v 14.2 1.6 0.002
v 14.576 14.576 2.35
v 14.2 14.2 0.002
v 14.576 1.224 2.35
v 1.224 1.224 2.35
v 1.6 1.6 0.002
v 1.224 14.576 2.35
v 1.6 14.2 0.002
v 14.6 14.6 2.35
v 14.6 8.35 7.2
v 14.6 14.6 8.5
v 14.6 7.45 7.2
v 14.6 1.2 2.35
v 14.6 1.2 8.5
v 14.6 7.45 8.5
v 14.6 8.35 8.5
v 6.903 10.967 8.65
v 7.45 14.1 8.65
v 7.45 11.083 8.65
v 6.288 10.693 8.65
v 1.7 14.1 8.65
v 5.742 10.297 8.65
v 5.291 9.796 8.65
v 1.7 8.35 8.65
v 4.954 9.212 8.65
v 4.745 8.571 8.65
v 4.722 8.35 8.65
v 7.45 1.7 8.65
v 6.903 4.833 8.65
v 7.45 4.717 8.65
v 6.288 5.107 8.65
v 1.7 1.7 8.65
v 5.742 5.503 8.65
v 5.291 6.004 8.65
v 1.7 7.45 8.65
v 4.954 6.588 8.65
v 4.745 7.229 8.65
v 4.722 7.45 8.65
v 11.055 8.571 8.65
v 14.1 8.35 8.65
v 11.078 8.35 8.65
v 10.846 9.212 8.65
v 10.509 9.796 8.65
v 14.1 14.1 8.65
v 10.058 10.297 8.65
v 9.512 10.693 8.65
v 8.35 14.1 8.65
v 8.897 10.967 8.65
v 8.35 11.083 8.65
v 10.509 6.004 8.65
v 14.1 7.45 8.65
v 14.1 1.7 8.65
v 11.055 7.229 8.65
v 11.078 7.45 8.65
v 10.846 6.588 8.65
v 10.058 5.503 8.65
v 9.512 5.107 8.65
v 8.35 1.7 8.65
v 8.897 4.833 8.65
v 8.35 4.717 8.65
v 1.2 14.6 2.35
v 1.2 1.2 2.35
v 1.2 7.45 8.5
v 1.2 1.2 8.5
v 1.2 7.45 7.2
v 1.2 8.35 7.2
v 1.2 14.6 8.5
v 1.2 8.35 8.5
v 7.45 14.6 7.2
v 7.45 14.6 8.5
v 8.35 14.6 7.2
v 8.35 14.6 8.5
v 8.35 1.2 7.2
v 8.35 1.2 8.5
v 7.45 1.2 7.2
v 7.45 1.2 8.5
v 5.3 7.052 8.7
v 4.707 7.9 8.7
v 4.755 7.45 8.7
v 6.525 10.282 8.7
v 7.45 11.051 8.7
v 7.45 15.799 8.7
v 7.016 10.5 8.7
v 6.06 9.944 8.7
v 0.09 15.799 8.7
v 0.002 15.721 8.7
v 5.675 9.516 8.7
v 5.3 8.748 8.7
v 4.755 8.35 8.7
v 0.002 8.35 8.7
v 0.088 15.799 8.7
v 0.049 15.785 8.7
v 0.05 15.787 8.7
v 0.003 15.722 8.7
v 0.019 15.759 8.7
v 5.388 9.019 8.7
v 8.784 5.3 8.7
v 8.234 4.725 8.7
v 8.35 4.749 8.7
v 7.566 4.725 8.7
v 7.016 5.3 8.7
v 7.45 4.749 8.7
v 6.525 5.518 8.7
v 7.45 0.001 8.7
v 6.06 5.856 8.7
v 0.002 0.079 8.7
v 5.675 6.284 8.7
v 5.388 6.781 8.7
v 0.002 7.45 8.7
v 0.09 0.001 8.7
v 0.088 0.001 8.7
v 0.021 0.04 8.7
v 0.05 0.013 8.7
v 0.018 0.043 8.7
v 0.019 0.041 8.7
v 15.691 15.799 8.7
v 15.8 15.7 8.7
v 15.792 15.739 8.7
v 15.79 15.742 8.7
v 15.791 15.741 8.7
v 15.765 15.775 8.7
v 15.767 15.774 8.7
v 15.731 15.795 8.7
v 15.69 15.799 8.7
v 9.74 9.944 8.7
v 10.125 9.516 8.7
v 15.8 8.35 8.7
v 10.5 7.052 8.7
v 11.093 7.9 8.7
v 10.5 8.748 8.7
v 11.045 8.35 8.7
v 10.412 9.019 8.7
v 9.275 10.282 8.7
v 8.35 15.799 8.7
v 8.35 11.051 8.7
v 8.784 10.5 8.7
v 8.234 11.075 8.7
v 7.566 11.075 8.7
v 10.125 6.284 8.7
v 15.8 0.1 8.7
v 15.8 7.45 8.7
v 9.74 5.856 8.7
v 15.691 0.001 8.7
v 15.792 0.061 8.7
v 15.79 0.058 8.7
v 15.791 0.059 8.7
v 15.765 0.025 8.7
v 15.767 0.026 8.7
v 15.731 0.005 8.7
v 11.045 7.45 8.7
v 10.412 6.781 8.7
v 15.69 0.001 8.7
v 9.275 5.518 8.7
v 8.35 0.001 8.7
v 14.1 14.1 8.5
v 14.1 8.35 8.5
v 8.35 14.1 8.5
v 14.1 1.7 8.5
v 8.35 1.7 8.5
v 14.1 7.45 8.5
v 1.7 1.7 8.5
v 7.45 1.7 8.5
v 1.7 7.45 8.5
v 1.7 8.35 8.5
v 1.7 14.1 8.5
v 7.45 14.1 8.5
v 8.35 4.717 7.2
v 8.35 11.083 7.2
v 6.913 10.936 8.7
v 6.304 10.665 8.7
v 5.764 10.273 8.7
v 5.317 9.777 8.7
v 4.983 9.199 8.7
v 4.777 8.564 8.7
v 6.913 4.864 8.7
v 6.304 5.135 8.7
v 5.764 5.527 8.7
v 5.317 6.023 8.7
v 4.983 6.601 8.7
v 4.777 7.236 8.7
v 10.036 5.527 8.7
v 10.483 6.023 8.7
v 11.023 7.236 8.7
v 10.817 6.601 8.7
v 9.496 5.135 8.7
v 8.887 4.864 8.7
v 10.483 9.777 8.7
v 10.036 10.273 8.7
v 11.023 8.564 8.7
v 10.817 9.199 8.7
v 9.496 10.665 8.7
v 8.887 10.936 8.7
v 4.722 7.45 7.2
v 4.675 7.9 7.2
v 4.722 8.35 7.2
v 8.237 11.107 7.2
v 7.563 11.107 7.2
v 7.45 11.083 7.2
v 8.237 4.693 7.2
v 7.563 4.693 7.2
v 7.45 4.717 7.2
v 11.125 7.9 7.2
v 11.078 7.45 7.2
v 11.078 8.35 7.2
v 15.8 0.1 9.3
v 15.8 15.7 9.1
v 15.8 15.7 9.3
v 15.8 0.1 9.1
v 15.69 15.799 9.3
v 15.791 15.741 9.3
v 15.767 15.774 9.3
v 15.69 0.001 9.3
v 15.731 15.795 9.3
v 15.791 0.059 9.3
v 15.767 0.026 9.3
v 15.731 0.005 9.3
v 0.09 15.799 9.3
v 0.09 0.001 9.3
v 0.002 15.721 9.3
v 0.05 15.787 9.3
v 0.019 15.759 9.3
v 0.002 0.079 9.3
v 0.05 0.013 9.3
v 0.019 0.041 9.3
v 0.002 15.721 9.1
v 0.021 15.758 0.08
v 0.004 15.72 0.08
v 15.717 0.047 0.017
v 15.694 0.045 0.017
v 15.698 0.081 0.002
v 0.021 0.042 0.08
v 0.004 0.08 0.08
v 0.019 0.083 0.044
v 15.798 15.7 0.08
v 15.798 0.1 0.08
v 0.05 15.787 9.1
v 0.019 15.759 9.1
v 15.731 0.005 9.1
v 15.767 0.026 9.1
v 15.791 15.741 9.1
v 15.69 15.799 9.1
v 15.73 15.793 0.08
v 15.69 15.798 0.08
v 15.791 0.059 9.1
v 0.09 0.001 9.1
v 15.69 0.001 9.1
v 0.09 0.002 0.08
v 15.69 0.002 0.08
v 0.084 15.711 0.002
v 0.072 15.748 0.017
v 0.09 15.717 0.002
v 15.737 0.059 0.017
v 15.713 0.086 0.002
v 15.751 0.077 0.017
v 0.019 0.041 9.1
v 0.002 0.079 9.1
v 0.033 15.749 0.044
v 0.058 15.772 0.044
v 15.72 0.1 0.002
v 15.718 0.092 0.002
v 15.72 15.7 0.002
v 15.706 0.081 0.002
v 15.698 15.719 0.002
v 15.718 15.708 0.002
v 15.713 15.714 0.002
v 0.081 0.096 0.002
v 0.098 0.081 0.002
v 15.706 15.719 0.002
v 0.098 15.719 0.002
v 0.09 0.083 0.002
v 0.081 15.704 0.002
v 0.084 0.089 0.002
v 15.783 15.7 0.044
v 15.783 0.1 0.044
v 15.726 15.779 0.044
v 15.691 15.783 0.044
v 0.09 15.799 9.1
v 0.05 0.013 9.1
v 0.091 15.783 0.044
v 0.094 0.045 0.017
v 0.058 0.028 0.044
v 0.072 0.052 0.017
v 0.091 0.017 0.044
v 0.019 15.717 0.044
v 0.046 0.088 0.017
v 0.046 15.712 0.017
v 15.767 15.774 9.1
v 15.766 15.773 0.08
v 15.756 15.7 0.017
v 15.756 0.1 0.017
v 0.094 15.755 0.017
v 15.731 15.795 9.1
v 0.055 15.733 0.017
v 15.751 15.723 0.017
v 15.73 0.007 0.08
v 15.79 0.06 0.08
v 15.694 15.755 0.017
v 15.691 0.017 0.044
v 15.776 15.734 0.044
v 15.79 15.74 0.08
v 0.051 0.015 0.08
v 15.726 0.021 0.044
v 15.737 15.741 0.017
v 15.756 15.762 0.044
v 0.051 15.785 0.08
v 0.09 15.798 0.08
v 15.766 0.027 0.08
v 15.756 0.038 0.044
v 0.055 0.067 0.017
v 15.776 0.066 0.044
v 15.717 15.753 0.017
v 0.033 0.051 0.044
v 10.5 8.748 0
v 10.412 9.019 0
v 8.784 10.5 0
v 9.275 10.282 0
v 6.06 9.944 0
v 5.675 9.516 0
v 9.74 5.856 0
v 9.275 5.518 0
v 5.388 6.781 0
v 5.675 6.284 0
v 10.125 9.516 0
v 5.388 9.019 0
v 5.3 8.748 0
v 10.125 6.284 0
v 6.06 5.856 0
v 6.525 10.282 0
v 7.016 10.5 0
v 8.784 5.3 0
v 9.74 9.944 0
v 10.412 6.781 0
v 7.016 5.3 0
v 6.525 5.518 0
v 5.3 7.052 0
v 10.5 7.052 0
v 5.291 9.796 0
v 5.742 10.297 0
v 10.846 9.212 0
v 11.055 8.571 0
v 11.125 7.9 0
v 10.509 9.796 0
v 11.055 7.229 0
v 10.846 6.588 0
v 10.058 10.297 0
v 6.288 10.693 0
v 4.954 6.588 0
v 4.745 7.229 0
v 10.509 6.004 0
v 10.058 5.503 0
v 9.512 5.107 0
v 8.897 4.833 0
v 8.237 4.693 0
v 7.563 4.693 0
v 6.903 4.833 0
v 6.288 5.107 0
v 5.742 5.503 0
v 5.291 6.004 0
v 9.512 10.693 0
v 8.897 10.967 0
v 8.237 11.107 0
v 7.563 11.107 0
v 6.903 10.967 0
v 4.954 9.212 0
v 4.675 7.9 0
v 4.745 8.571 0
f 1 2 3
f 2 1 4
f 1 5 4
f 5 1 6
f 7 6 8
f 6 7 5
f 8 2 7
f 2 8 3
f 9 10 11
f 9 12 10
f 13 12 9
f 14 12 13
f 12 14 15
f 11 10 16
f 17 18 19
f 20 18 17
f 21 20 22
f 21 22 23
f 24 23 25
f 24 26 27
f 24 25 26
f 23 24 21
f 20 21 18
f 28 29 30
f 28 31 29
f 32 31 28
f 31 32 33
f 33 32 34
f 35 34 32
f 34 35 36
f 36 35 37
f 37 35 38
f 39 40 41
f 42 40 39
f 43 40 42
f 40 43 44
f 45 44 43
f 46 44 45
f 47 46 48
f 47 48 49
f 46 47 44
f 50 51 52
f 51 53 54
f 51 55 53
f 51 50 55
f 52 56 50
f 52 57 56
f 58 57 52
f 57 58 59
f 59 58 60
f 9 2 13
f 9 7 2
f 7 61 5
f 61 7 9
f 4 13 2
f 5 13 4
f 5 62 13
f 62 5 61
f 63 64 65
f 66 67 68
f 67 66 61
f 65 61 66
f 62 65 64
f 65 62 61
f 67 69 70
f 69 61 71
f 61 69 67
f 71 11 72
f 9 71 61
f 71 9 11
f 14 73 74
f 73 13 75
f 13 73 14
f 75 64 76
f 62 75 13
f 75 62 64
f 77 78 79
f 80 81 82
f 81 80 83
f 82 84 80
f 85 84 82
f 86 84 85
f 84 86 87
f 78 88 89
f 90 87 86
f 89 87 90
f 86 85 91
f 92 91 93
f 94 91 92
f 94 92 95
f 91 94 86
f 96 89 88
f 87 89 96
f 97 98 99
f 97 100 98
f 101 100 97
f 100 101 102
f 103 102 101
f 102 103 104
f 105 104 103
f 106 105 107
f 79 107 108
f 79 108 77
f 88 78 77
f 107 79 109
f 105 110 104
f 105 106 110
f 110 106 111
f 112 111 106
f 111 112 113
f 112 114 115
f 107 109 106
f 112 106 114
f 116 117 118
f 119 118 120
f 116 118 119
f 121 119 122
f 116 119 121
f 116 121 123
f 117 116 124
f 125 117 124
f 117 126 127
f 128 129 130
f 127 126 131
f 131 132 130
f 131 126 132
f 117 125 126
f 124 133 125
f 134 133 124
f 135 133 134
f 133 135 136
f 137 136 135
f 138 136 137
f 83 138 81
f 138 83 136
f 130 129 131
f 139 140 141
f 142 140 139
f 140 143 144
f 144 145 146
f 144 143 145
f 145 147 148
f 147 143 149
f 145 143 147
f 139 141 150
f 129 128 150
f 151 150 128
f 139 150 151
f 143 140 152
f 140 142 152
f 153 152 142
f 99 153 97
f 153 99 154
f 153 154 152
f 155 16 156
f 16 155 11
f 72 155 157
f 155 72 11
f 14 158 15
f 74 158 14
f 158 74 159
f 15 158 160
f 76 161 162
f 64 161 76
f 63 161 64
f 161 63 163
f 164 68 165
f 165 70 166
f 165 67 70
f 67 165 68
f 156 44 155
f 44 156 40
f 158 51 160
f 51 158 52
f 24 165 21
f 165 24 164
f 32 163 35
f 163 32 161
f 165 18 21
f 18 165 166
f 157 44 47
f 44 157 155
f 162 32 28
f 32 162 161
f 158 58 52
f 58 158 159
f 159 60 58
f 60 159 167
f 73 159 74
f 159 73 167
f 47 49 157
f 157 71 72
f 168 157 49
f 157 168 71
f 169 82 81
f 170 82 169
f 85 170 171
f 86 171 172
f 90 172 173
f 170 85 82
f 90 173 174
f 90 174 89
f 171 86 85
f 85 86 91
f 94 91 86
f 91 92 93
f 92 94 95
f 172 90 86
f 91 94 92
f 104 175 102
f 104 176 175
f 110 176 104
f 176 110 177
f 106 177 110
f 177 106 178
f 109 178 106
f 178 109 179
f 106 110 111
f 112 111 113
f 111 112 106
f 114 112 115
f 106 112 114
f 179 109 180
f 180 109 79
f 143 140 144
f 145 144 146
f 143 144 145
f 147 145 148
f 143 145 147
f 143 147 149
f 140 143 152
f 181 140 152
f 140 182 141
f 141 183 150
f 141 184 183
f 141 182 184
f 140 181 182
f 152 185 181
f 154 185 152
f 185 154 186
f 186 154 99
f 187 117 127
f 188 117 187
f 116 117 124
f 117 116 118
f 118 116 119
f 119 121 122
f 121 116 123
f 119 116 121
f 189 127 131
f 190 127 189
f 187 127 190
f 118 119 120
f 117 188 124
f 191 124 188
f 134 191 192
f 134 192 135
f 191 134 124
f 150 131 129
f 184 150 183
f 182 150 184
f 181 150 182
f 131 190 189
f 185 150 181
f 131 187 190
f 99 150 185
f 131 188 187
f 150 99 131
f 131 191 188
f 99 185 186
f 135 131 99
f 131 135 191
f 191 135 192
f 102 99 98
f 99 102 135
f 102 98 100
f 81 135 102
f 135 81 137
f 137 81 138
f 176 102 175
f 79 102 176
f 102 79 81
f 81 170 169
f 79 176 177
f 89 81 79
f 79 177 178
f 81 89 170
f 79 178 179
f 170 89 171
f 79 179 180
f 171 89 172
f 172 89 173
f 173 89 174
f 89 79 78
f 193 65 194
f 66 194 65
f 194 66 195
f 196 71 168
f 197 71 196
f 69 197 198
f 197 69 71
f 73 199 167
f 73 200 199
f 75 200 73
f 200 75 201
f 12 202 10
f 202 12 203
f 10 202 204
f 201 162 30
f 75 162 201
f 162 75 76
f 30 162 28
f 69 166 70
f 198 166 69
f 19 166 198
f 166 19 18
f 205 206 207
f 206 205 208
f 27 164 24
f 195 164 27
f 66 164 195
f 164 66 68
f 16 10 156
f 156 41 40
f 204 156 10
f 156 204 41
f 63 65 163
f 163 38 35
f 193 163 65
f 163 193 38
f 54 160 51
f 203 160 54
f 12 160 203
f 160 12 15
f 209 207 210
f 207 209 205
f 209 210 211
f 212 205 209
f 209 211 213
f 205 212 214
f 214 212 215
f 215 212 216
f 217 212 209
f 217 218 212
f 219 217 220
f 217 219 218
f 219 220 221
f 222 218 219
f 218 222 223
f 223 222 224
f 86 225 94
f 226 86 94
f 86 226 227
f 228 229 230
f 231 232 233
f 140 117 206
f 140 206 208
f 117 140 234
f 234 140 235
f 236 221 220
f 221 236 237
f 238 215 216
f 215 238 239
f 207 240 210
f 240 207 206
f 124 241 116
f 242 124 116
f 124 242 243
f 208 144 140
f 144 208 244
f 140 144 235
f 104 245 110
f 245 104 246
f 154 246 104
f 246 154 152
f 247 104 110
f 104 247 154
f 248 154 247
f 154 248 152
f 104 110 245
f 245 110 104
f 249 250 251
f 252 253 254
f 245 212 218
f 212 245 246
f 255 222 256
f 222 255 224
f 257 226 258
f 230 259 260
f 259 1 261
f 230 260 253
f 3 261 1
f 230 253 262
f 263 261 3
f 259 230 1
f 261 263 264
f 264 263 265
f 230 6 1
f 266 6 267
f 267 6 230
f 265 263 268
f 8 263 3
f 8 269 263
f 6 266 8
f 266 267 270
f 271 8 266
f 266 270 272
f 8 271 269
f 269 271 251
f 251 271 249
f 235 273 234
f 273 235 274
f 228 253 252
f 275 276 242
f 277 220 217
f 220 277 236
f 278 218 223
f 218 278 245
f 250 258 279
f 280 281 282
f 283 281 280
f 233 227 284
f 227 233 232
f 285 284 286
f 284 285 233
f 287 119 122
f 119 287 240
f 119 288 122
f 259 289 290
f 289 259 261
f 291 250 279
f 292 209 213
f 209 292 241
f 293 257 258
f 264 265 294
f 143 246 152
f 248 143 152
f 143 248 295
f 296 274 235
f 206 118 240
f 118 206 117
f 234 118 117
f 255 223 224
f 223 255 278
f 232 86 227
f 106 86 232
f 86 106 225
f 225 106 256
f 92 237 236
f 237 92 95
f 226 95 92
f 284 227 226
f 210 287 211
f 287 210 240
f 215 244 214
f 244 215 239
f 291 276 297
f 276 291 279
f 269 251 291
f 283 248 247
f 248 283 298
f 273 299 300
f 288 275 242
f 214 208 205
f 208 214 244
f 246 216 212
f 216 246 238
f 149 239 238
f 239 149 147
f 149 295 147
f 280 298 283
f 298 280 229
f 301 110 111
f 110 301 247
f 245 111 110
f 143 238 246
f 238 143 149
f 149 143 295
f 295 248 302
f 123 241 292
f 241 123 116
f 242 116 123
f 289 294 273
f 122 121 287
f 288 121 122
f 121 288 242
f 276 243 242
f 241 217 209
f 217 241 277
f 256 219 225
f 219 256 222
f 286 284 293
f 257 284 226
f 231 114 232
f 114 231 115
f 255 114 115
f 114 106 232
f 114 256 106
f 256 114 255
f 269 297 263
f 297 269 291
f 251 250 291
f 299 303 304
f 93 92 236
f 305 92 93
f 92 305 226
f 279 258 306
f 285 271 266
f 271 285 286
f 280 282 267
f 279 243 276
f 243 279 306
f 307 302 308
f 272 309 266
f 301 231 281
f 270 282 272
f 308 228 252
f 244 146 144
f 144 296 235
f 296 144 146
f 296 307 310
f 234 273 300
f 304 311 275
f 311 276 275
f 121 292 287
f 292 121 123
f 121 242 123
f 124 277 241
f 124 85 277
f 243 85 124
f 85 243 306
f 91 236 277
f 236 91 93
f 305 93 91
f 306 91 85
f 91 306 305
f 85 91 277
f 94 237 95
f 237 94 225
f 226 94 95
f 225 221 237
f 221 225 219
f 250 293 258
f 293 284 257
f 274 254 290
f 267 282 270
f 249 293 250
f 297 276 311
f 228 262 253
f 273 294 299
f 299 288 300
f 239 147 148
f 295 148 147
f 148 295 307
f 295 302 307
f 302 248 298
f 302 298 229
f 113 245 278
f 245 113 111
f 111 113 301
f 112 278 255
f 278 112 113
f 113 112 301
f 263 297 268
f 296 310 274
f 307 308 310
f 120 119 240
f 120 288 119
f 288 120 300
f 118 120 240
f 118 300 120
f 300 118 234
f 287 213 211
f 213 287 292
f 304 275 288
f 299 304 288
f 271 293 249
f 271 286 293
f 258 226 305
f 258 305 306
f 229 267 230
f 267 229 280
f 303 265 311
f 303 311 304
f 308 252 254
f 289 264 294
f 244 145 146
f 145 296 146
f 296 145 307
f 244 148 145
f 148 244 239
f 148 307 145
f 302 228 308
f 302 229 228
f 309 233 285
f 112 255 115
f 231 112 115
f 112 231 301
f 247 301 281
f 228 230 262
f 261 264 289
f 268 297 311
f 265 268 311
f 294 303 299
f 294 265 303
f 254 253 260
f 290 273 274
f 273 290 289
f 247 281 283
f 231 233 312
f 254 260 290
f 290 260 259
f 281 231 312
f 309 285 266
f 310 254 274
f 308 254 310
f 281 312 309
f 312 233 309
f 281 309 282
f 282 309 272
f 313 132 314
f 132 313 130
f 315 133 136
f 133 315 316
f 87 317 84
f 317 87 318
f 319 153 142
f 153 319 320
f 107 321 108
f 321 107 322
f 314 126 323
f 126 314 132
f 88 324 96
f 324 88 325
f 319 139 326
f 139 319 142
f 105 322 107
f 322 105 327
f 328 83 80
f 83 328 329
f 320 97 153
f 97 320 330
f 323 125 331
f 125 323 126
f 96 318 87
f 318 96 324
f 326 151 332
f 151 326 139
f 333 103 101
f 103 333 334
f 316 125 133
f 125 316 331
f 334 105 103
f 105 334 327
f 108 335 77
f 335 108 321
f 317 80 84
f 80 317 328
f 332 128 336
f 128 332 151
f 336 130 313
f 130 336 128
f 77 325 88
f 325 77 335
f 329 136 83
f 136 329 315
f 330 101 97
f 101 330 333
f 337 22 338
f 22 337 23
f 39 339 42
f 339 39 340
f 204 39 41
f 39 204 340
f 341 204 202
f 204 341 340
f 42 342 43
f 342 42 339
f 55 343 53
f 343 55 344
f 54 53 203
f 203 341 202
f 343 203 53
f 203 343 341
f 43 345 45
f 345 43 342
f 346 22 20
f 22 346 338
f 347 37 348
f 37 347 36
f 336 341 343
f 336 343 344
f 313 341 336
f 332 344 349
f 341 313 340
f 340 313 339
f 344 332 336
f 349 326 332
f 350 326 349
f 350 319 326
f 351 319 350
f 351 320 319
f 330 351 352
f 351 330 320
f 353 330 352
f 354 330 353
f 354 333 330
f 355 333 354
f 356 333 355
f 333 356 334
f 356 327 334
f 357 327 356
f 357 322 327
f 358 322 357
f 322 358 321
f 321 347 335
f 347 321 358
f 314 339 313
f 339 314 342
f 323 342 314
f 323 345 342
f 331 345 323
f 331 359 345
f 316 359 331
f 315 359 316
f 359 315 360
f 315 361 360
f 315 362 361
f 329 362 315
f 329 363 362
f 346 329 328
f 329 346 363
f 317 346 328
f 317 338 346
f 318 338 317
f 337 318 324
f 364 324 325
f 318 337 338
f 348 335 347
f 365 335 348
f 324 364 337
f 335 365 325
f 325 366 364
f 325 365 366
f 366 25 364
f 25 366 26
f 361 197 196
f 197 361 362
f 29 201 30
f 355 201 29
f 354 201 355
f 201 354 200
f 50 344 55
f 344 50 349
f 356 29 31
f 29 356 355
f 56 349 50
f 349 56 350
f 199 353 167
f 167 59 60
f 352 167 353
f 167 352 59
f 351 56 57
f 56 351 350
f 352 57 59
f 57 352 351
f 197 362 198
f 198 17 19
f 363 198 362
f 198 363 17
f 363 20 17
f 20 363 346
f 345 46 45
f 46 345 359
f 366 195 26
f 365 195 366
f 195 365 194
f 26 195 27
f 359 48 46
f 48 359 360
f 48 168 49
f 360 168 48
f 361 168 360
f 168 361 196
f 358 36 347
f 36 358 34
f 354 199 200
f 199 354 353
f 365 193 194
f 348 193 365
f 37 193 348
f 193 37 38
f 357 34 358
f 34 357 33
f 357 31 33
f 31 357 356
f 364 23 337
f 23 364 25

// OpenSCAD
// file: ../lib/brick-hollow.scad
/**
* Machine Blocks
* https://machinemania.net/blocks 
*
* Brick Hollow
* Copyright (c) 2022 Jan Philipp Knoeller <pk@pksoftware.de>
*
* Published under license:
* Creative Commons Attribution-NonCommercial-ShareAlike 4.0 International 
* https://creativecommons.org/licenses/by-nc-sa/4.0/
*
*/
echo(version=version());

module brickHollow(height=9.3, fade=2.5, minSize=[4.6,4.6], maxSize=[5.2, 5.2], center = false){
    echo(height, minSize, maxSize, fade);
    sizeX = max(minSize[0],maxSize[0]); 
   sizeY = max(minSize[1],maxSize[1]); 
    
    posX = center ? 0 : 0.5*sizeX; 
   posY = center ? 0 : 0.5*sizeY;   
   posZ = center ? -0.5 * (height-fade) : 0.5*fade;
    
    cutHelper = 0.2;
    overlapSpace=0.1;
    
    translate([posX, posY, posZ]){
        union(){
            polyhedron(points=[
                [-0.5*minSize[0],-0.5*minSize[1],-0.5*fade],
                [0.5*minSize[0],-0.5*minSize[1],-0.5*fade],
                [0.5*minSize[0],0.5*minSize[1],-0.5*fade],
                [-0.5*minSize[0],0.5*minSize[1],-0.5*fade],
                [-0.5*maxSize[0],-0.5*maxSize[1],0.5*fade],
                [0.5*maxSize[0],-0.5*maxSize[1],0.5*fade],
                [0.5*maxSize[0],0.5*maxSize[1],0.5*fade],
                [-0.5*maxSize[0],0.5*maxSize[1],0.5*fade]
            ], faces=[[0,1,2,3],[1,0,4,5],[2,1,5,6],[3,2,6,7],[0,3,7,4],[7,6,5,4]]);
            
            if(height > fade){
                translate([0,0,0.5*height - overlapSpace]){
                    cube([maxSize[0], maxSize[1], height - fade + overlapSpace], center=true);
                }
            }
            
            translate([0,0,-0.5*(fade + cutHelper) + overlapSpace]){
                cube([minSize[0], minSize[1], cutHelper + overlapSpace], center=true);
            }
        }
    }
}

//brickHollow(height=9.3, maxSize=[5.2,5.2], minSize=[4.6,4.6], center=true);
// file: ../lib/roundedcube_simple.scad
/**
* Machine Blocks
* https://machinemania.net/blocks 
*
* Module for simple rounded cubes
* Copyright (c) 2022 Jan Philipp Knoeller <pk@pksoftware.de>
*
* Published under license:
* Creative Commons Attribution-NonCommercial-ShareAlike 4.0 International 
* https://creativecommons.org/licenses/by-nc-sa/4.0/
*
*/
module roundedcube_simple(size = [1, 1, 1], center = false, radius = 0.5, resolution = 20) {
	// If single value, convert to [x, y, z] vector
	size = (size[0] == undef) ? [size, size, size] : size;

	translate = (center == false) ?
		[radius, radius, radius] :
		[
			radius - (size[0] / 2),
			radius - (size[1] / 2),
			radius - (size[2] / 2)
	];

	translate(v = translate)
	minkowski() {
		cube(size = [
			size[0] - (radius * 2),
			size[1] - (radius * 2),
			size[2] - (radius * 2)
		]);
		sphere(r = radius, $fn = resolution);
	}
}
// file: ../lib/roundedcube.scad
// More information: https://danielupshaw.com/openscad-rounded-corners/

// Set to 0.01 for higher definition curves (renders slower)
$fs = 0.15;

module roundedcube(size = [1, 1, 1], center = false, radius = 0.5, apply_to = "all", resolution = 20) {
	// If single value, convert to [x, y, z] vector
	size = (size[0] == undef) ? [size, size, size] : size;

	translate_min = radius;
	translate_xmax = size[0] - radius;
	translate_ymax = size[1] - radius;
	translate_zmax = size[2] - radius;

	diameter = radius * 2;

	obj_translate = (center == false) ?
		[0, 0, 0] : [
			-(size[0] / 2),
			-(size[1] / 2),
			-(size[2] / 2)
		];

	translate(v = obj_translate) {
		hull() {
			for (translate_x = [translate_min, translate_xmax]) {
				x_at = (translate_x == translate_min) ? "min" : "max";
				for (translate_y = [translate_min, translate_ymax]) {
					y_at = (translate_y == translate_min) ? "min" : "max";
					for (translate_z = [translate_min, translate_zmax]) {
						z_at = (translate_z == translate_min) ? "min" : "max";

						translate(v = [translate_x, translate_y, translate_z])
						if (
							(apply_to == "all") ||
							(apply_to == "xmin" && x_at == "min") || (apply_to == "xmax" && x_at == "max") ||
							(apply_to == "ymin" && y_at == "min") || (apply_to == "ymax" && y_at == "max") ||
							(apply_to == "zmin" && z_at == "min") || (apply_to == "zmax" && z_at == "max")
						) {
							sphere(r = radius, $fn = resolution);
						} else {
							rotate = 
								(apply_to == "xmin" || apply_to == "xmax" || apply_to == "x") ? [0, 90, 0] : (
								(apply_to == "ymin" || apply_to == "ymax" || apply_to == "y") ? [90, 90, 0] :
								[0, 0, 0]
							);
							rotate(a = rotate)
							cylinder(h = diameter, r = radius, center = true, $fn = resolution);
						}
					}
				}
			}
		}
	}
}
// main file
/**
* Machine Blocks
* https://machinemania.net/blocks 
*
* Brick 2x2 without knobs
* Copyright (c) 2022 Jan Philipp Knoeller <pk@pksoftware.de>
*
* Published under license:
* Creative Commons Attribution-NonCommercial-ShareAlike 4.0 International 
* https://creativecommons.org/licenses/by-nc-sa/4.0/
*
*/
echo(version=version());

include <../lib/block-v2.scad>;

//2x2 Brick    
block(baseLayers=3, grid=[2,2], withKnobs=false);
